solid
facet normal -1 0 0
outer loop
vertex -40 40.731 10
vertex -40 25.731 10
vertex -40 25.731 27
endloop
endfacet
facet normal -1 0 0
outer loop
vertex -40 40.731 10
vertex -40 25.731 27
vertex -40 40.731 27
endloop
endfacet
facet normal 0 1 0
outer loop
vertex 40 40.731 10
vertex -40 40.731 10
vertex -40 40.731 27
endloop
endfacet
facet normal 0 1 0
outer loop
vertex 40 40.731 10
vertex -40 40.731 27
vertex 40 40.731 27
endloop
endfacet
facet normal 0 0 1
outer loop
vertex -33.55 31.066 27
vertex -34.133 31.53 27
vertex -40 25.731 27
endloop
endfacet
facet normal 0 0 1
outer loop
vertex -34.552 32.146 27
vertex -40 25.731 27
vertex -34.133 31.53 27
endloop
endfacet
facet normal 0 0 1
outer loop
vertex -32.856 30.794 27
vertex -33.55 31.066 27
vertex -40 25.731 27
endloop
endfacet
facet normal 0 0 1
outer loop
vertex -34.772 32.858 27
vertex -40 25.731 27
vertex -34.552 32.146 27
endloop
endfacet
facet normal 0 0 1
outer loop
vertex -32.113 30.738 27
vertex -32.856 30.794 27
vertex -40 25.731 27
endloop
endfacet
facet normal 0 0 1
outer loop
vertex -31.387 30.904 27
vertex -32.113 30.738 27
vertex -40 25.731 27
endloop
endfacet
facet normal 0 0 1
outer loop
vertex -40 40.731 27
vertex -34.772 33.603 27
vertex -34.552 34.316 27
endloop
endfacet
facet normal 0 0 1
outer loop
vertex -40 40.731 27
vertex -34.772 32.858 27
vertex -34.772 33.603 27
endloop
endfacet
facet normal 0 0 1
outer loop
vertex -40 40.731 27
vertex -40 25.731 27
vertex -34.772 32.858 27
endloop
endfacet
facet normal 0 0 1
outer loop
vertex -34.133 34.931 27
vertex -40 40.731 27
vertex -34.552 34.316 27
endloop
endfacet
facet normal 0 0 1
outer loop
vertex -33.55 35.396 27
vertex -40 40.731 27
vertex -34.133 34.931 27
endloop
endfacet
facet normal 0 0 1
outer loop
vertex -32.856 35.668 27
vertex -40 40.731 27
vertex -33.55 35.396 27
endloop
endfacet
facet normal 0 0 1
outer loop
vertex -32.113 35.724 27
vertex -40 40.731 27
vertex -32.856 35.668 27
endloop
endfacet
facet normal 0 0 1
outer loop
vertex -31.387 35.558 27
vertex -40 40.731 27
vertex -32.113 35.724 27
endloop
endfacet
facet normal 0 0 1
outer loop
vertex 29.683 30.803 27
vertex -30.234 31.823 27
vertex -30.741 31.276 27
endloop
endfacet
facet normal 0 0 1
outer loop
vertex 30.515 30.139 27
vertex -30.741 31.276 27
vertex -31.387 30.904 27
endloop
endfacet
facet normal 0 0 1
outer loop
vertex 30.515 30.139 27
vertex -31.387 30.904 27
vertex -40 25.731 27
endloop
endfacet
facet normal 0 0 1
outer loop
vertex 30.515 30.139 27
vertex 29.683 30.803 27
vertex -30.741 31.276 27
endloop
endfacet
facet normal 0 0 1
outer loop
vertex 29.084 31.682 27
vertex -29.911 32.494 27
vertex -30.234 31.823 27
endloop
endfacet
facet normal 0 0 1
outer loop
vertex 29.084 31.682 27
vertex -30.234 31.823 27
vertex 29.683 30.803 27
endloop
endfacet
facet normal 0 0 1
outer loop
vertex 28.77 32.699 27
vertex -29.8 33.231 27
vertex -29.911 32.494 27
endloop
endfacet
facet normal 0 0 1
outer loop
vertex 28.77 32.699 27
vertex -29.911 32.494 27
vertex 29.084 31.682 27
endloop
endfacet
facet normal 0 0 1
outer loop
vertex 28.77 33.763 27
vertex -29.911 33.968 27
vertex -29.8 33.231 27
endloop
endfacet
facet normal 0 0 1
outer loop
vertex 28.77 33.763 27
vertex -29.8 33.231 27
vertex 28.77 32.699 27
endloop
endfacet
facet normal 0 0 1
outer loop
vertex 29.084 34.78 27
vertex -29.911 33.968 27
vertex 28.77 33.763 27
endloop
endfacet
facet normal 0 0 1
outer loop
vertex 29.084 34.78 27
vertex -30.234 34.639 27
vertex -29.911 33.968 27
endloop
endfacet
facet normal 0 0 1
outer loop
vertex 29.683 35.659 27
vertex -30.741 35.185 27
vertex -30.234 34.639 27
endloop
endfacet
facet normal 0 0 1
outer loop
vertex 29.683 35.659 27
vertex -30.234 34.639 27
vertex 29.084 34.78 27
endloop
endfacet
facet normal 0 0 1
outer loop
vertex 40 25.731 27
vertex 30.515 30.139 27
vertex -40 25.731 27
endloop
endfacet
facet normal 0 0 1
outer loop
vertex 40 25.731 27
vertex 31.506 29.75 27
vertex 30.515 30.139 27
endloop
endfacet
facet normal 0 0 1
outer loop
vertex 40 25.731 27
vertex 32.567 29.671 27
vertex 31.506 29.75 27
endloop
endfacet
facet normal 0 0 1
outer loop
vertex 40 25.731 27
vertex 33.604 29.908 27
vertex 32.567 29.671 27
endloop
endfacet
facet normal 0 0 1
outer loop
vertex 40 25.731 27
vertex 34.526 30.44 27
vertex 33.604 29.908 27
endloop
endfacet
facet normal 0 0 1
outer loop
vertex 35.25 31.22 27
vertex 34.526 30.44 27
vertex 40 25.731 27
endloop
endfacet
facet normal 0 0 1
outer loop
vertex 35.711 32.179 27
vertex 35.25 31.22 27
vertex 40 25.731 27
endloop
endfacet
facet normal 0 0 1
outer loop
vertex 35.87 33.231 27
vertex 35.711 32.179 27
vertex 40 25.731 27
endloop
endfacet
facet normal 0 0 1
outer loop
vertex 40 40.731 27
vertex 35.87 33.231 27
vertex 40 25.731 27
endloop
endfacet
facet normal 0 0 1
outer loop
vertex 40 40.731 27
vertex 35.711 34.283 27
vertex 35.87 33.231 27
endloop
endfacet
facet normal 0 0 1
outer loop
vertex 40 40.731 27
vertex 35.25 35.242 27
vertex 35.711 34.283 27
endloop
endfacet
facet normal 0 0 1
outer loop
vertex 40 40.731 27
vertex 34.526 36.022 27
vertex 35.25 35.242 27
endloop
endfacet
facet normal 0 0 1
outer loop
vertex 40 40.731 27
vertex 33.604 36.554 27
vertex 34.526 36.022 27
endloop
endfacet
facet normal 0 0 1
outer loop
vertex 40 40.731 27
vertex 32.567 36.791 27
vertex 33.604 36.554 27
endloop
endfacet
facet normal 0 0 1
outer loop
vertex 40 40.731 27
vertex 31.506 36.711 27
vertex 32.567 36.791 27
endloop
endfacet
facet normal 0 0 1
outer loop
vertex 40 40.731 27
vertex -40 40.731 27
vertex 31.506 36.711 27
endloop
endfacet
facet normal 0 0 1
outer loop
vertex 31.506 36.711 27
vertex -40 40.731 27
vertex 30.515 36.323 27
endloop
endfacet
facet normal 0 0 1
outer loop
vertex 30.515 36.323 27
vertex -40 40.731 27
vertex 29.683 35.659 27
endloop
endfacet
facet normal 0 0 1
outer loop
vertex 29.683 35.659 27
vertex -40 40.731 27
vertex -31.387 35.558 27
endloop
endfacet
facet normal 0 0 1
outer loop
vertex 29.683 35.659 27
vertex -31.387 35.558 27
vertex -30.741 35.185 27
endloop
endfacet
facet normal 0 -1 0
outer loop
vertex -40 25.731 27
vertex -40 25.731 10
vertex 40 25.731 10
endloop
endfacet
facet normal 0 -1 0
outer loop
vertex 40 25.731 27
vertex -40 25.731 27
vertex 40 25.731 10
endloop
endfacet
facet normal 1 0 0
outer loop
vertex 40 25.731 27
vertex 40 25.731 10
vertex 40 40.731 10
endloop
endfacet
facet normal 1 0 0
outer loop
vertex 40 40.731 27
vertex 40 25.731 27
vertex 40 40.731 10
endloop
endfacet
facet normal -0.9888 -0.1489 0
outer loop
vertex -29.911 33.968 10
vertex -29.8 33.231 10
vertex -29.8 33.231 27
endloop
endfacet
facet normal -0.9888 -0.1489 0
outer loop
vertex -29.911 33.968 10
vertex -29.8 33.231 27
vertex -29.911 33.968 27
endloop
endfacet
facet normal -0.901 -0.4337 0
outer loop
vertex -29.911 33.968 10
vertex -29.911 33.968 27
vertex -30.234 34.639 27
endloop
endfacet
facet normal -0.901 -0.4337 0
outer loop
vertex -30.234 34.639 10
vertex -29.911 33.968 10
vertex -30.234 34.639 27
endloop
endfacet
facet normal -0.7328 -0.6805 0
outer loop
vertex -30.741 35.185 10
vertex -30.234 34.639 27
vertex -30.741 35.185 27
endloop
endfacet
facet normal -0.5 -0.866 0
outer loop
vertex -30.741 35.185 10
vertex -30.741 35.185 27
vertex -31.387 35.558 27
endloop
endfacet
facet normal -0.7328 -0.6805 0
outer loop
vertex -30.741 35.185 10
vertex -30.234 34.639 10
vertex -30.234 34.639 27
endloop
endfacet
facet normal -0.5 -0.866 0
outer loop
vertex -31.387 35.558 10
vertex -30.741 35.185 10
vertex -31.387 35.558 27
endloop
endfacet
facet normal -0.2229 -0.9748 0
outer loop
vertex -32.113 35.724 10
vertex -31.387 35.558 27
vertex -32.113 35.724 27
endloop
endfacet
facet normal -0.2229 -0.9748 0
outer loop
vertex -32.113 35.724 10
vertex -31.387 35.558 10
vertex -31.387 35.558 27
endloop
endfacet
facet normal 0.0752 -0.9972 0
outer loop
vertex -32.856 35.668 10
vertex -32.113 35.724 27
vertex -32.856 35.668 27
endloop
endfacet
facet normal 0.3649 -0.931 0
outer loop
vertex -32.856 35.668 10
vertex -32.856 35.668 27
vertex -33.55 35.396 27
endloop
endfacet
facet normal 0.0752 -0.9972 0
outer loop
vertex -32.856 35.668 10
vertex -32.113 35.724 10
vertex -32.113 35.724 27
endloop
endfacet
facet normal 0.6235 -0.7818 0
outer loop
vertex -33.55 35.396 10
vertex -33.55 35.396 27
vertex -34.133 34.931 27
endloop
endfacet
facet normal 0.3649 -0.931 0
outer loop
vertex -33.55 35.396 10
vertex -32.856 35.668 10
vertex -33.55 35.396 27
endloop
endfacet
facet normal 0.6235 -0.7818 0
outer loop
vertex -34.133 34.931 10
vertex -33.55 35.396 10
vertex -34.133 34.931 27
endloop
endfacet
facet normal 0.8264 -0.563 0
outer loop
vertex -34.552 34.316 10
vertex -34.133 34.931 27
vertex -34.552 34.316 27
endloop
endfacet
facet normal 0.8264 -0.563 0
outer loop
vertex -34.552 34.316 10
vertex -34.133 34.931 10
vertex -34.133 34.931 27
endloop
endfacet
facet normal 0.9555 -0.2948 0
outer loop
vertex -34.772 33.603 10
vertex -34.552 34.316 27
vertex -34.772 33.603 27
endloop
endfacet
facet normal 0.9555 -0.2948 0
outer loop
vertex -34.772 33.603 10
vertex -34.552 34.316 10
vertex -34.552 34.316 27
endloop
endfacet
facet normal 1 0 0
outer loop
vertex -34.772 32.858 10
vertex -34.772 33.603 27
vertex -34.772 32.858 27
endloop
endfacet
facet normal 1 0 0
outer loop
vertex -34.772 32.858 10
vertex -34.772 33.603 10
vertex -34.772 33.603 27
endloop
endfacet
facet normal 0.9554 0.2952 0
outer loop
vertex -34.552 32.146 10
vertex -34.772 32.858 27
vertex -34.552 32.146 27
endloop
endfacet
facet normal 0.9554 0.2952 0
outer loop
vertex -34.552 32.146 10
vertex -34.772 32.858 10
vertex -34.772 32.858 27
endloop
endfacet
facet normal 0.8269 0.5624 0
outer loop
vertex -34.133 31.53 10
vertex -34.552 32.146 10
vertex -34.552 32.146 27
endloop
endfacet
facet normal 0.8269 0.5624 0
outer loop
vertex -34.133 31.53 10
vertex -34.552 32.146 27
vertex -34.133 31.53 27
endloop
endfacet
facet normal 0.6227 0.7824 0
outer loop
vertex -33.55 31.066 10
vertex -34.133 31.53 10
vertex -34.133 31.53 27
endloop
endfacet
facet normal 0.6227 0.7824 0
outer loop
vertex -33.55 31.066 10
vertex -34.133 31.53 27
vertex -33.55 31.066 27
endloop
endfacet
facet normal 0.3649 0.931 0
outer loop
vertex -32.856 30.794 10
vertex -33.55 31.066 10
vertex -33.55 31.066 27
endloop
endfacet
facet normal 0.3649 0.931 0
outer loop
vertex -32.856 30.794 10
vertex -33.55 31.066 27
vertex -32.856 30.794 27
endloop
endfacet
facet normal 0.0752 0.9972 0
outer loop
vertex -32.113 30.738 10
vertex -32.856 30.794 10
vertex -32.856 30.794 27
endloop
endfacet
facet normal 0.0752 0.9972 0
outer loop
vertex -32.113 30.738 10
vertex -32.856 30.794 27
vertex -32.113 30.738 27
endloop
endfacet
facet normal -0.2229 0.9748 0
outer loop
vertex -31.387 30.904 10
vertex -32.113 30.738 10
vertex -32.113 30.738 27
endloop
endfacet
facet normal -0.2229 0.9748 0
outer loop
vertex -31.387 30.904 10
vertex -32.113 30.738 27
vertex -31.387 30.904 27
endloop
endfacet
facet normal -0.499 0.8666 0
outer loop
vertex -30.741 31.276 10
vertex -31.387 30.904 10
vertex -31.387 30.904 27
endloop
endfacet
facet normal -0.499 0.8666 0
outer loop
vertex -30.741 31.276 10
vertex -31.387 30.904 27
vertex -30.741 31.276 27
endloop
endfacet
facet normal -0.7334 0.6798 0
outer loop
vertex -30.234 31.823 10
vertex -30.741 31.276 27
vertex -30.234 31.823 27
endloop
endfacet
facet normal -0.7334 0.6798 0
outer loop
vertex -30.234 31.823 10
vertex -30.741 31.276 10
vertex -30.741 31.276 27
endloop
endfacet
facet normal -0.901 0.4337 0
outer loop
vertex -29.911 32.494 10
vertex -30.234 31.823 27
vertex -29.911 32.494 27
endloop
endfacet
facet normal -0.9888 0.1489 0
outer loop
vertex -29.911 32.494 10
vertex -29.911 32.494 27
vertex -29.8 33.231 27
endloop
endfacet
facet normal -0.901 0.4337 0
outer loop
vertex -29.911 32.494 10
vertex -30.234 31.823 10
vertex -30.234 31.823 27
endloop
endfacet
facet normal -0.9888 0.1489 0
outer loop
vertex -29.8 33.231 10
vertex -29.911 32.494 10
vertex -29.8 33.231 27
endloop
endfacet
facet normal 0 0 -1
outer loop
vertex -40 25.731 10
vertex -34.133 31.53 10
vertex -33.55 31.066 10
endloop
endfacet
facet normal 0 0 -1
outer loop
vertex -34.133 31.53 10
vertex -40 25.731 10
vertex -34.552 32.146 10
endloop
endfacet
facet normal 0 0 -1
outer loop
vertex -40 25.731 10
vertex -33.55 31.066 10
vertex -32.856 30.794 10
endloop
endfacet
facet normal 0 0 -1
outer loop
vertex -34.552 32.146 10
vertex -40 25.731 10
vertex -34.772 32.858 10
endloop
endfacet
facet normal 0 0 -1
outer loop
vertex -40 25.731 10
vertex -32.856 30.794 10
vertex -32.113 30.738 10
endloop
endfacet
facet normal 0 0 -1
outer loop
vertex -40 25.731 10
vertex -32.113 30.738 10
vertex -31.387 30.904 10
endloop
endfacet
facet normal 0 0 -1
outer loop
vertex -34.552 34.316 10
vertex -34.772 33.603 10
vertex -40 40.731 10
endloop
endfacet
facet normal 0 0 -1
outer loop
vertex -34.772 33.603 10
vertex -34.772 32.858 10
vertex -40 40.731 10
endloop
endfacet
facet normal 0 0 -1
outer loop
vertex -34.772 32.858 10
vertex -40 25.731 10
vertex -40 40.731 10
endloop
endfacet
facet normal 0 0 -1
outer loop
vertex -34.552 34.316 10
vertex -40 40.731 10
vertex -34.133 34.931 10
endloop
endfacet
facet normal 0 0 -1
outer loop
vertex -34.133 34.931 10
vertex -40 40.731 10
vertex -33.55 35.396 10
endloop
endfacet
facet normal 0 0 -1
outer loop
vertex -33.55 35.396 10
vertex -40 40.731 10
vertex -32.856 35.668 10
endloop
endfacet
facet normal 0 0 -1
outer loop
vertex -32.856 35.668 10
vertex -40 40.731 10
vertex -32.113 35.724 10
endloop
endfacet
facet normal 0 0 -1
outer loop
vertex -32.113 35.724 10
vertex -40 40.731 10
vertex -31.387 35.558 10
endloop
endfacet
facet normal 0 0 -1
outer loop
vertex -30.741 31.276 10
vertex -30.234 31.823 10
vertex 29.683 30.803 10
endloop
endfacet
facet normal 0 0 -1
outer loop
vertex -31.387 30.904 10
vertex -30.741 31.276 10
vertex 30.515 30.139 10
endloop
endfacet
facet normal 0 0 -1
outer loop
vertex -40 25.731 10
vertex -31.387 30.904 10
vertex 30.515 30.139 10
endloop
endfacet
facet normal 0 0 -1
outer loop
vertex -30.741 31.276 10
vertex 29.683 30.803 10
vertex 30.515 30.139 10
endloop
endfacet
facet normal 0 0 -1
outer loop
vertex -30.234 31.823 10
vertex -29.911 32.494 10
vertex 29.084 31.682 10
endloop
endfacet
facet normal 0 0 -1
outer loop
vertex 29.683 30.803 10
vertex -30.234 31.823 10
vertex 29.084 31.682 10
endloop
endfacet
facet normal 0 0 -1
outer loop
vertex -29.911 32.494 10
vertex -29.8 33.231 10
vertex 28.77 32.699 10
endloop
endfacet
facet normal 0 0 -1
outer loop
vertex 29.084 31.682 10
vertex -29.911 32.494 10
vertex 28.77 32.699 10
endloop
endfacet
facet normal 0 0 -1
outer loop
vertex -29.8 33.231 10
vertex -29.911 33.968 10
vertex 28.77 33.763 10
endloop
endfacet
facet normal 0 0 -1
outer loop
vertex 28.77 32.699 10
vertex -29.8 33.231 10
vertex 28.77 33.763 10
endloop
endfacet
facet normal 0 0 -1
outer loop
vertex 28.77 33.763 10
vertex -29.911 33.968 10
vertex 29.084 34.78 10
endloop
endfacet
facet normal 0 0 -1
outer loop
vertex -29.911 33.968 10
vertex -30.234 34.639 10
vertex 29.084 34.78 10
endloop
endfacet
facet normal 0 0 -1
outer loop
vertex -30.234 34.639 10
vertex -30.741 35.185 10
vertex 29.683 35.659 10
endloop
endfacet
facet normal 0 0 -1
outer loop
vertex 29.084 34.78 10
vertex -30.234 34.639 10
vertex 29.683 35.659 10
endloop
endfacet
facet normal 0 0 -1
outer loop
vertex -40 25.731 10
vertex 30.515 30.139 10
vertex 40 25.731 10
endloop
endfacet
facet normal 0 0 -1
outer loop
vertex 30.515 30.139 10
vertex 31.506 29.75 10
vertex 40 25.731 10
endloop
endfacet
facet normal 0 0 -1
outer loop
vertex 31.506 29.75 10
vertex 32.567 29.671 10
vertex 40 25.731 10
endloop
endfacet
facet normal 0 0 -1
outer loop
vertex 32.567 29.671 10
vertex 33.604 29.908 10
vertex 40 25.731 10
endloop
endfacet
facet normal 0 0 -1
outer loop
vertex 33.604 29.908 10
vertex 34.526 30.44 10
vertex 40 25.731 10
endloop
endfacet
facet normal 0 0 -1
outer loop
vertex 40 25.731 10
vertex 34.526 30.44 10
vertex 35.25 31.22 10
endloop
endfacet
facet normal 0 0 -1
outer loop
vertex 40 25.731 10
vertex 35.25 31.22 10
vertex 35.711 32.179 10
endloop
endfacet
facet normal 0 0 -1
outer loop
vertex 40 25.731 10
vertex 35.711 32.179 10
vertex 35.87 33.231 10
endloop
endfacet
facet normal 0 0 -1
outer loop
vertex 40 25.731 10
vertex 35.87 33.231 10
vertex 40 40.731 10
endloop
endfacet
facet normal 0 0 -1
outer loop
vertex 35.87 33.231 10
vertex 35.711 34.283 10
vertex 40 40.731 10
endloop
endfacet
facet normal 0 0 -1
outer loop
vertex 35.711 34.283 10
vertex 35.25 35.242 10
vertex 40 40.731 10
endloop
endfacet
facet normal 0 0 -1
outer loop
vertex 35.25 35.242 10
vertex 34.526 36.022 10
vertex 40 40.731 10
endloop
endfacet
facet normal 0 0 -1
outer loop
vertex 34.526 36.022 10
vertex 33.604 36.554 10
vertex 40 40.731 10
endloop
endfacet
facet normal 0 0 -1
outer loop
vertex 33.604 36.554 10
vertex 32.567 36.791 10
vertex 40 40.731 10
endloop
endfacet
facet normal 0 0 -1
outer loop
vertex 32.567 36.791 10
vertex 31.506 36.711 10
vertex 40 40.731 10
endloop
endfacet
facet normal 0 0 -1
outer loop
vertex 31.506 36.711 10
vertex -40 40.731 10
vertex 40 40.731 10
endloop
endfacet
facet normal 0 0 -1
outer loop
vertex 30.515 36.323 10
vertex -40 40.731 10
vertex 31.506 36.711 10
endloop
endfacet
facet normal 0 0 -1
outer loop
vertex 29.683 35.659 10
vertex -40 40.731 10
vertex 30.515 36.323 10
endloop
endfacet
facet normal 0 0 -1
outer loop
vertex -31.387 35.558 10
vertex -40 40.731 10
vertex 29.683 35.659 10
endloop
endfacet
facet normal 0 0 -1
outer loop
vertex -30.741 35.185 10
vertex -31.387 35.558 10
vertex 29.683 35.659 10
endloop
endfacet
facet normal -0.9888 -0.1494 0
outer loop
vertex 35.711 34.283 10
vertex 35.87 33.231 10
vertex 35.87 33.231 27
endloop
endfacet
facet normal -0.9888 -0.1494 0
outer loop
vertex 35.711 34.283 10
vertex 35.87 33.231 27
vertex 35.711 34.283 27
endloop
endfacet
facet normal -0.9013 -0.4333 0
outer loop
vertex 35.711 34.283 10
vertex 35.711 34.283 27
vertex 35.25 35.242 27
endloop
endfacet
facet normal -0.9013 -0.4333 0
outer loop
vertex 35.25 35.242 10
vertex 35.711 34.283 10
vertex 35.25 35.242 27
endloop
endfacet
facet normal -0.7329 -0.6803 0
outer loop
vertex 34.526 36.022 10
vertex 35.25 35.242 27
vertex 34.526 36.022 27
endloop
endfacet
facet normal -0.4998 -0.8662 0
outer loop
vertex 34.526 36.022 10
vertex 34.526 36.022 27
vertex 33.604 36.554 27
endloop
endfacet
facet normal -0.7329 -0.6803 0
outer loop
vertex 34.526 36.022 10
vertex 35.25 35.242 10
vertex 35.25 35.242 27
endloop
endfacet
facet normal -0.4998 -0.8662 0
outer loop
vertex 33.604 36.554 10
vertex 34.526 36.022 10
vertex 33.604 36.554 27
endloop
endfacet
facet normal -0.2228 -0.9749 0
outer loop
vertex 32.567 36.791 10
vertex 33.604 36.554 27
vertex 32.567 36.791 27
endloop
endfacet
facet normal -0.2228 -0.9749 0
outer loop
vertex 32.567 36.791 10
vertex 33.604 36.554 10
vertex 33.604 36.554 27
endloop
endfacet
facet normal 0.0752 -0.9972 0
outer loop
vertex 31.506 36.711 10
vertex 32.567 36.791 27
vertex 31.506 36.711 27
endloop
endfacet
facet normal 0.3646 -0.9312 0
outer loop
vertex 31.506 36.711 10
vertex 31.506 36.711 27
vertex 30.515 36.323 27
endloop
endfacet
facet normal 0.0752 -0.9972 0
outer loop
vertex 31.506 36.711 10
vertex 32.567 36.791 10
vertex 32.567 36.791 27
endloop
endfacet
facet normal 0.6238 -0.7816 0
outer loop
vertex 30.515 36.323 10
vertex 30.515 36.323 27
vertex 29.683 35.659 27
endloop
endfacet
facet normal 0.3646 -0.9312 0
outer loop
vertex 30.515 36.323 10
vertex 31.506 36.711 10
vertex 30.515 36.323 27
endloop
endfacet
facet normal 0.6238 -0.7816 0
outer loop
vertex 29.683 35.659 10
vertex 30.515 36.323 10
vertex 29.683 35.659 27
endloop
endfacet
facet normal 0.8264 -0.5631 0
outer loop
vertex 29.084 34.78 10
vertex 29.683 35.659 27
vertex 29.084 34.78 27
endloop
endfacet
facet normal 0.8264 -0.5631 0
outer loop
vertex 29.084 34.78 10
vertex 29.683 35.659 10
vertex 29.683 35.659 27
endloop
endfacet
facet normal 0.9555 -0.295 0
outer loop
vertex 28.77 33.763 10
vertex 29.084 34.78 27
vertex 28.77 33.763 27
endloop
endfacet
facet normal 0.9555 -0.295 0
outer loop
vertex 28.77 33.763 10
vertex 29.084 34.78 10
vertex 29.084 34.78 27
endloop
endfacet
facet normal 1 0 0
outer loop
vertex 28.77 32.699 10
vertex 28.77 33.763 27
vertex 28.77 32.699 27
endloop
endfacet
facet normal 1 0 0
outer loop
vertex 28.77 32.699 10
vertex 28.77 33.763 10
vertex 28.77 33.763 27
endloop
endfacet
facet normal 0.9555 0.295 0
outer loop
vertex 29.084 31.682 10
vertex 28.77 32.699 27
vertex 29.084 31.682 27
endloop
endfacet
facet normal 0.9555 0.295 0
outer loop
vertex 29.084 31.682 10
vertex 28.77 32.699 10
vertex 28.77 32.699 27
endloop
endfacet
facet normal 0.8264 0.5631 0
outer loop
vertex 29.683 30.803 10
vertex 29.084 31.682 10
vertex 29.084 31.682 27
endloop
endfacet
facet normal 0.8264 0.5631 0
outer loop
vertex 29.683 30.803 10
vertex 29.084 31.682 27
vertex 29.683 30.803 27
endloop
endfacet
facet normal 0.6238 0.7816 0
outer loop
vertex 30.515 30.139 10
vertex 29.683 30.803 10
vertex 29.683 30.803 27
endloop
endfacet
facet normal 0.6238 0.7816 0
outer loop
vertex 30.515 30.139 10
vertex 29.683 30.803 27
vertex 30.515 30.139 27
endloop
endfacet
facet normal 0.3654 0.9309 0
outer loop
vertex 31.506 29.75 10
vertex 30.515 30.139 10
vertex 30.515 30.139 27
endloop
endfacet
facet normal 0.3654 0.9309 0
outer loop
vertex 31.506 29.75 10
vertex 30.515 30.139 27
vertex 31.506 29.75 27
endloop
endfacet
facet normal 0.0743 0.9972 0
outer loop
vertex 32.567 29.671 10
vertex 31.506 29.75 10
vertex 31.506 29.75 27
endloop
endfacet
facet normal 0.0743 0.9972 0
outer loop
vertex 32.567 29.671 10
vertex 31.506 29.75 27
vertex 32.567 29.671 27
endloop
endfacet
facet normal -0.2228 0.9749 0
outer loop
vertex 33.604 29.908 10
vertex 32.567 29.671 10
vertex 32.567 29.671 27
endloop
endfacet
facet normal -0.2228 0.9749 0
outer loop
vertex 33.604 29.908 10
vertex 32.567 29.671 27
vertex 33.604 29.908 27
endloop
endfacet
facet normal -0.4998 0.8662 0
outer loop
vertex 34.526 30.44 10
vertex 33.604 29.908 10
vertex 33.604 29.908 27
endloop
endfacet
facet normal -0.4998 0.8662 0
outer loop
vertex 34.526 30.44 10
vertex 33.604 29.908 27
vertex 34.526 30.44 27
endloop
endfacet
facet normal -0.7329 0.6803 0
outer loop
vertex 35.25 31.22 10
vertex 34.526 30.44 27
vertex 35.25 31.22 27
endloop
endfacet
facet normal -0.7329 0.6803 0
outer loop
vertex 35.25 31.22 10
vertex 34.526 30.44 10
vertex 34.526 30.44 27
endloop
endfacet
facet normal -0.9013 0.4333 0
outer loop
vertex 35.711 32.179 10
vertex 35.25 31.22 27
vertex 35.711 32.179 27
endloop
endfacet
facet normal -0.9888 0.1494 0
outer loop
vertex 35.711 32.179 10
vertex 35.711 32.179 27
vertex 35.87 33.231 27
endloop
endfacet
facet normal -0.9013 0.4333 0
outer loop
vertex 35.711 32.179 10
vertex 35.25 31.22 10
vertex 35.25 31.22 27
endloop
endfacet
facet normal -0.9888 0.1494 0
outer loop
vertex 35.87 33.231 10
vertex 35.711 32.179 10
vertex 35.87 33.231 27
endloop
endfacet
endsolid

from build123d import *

# Parameters (mm, degrees)
BOSS_EXTRUDE1_START = 10
SKETCH1_W           = 80
SKETCH1_H           = 15
SKETCH1_R           = 3.57
SKETCH1_R_2         = 2.5
BOSS_EXTRUDE1_DEPTH = 17


with BuildPart() as part:
    # Sketch1 → Boss-Extrude1 (new body)
    with BuildSketch(Plane.XY.offset(BOSS_EXTRUDE1_START)):
        with Locations((0, 33.230865744)):
            Rectangle(SKETCH1_W, SKETCH1_H)
        with Locations((32.3, 33.230865744)):
            Circle(SKETCH1_R, mode=Mode.SUBTRACT)
        with Locations((-32.3, 33.230865744)):
            Circle(SKETCH1_R_2, mode=Mode.SUBTRACT)
    extrude(amount=BOSS_EXTRUDE1_DEPTH)


solid = part.part
